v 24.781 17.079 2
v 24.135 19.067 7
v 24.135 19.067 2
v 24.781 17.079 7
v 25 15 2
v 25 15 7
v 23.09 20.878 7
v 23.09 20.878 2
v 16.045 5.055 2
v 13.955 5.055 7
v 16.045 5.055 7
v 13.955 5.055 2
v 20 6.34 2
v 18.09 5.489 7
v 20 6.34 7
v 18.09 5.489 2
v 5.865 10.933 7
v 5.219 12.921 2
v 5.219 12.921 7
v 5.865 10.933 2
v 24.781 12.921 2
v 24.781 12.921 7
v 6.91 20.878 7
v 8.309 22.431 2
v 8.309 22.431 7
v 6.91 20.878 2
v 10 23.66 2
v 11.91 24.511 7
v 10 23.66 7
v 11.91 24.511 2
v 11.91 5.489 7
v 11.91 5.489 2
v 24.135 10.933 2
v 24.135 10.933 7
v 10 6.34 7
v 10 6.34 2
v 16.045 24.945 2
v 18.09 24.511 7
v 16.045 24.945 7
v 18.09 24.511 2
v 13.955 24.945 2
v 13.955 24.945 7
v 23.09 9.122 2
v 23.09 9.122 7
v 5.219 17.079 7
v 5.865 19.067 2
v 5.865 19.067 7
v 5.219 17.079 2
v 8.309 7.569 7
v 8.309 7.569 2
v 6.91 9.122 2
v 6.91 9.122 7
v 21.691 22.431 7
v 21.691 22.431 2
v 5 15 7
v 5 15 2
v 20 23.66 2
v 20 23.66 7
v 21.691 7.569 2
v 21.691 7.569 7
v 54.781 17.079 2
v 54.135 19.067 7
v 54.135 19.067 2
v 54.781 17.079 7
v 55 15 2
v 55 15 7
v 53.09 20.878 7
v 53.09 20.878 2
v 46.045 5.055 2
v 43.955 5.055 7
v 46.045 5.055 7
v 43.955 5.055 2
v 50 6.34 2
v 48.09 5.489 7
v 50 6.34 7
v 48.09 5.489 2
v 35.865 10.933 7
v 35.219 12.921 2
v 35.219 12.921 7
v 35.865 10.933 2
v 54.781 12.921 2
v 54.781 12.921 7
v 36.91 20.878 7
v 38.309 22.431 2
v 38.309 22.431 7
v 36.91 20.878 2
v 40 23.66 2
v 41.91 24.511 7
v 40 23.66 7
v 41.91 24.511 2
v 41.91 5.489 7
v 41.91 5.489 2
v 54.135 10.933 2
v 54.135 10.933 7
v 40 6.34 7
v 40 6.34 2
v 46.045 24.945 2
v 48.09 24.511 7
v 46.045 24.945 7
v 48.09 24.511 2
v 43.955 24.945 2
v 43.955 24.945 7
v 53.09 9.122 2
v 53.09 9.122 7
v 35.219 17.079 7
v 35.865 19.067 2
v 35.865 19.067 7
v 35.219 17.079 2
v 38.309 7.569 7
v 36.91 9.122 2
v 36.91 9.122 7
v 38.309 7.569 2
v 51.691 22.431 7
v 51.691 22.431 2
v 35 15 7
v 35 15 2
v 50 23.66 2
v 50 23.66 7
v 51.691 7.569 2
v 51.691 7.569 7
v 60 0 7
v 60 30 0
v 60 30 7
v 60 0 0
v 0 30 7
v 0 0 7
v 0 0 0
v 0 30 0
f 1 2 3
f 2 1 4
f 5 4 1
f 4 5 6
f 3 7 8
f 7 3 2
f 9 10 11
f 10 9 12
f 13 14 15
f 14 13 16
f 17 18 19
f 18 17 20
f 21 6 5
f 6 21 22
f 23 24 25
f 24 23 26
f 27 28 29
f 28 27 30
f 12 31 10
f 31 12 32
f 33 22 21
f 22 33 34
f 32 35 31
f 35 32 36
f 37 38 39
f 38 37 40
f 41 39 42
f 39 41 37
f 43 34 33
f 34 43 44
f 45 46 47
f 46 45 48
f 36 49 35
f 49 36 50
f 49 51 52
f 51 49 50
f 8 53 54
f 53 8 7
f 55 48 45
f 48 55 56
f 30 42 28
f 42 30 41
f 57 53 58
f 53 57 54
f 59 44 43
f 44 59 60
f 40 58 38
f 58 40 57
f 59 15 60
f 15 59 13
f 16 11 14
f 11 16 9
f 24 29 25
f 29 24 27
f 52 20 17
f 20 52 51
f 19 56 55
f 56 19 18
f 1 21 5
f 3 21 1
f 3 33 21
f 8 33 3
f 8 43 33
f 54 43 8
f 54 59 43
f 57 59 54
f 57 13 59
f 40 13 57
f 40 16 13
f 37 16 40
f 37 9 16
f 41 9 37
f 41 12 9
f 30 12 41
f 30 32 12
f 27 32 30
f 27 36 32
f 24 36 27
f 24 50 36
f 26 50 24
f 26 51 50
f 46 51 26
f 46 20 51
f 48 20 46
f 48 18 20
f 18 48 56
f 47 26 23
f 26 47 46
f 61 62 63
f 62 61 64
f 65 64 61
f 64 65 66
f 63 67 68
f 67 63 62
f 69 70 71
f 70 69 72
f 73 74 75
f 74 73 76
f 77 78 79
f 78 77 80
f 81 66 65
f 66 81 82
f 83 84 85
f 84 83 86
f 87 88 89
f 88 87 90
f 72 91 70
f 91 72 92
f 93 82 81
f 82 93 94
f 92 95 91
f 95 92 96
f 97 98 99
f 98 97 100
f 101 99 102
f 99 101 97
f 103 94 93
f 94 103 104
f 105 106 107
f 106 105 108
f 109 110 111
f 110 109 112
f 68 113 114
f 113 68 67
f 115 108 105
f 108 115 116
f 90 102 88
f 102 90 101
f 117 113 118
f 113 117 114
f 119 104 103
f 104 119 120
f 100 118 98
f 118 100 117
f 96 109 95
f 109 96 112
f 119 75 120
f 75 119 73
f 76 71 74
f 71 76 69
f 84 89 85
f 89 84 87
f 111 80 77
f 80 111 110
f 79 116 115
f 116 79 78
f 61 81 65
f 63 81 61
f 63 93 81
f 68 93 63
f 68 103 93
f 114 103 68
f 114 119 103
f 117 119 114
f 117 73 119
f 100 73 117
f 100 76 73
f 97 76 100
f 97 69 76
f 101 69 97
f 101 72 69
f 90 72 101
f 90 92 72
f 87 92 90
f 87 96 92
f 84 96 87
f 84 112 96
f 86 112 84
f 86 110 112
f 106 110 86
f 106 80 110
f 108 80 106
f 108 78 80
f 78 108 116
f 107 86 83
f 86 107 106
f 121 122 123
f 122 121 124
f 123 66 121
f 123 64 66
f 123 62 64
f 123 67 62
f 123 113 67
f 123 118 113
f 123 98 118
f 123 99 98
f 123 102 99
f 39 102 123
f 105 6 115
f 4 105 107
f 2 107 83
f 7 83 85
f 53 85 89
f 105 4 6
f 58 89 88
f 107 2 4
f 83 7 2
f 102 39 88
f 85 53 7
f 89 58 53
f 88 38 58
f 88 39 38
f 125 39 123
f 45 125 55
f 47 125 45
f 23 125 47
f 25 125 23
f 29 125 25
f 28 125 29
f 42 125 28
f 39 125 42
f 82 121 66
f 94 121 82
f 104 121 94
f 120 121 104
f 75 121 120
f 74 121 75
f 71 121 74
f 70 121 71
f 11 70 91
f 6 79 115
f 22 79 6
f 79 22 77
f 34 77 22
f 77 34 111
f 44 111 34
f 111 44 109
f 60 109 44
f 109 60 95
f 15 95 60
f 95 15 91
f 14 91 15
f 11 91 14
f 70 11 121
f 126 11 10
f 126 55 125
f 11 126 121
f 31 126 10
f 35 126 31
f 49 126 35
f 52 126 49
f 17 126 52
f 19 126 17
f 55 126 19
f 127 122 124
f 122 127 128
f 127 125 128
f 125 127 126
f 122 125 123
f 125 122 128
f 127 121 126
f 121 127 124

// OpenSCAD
clipper_dia = 20;
clipper_height = 5;

clipper_dist = 10;
clipper_floor = 2;

count_x = 2;
count_y = 1;

module clipper() {
    cylinder(d = clipper_dia, h = clipper_height + 1);
}

difference() {
    cube([count_x * (clipper_dia + clipper_dist), count_y * (clipper_dia + clipper_dist), clipper_floor + clipper_height]);

    for (x = [0 : count_x - 1]) {
        for (y = [0 : count_y - 1]) {
            translate([x * (clipper_dia + clipper_dist), y * (clipper_dia + clipper_dist), 0])
            translate([(clipper_dia + clipper_dist) / 2, (clipper_dia + clipper_dist) / 2, clipper_floor])
            clipper();
        }
    }
}
